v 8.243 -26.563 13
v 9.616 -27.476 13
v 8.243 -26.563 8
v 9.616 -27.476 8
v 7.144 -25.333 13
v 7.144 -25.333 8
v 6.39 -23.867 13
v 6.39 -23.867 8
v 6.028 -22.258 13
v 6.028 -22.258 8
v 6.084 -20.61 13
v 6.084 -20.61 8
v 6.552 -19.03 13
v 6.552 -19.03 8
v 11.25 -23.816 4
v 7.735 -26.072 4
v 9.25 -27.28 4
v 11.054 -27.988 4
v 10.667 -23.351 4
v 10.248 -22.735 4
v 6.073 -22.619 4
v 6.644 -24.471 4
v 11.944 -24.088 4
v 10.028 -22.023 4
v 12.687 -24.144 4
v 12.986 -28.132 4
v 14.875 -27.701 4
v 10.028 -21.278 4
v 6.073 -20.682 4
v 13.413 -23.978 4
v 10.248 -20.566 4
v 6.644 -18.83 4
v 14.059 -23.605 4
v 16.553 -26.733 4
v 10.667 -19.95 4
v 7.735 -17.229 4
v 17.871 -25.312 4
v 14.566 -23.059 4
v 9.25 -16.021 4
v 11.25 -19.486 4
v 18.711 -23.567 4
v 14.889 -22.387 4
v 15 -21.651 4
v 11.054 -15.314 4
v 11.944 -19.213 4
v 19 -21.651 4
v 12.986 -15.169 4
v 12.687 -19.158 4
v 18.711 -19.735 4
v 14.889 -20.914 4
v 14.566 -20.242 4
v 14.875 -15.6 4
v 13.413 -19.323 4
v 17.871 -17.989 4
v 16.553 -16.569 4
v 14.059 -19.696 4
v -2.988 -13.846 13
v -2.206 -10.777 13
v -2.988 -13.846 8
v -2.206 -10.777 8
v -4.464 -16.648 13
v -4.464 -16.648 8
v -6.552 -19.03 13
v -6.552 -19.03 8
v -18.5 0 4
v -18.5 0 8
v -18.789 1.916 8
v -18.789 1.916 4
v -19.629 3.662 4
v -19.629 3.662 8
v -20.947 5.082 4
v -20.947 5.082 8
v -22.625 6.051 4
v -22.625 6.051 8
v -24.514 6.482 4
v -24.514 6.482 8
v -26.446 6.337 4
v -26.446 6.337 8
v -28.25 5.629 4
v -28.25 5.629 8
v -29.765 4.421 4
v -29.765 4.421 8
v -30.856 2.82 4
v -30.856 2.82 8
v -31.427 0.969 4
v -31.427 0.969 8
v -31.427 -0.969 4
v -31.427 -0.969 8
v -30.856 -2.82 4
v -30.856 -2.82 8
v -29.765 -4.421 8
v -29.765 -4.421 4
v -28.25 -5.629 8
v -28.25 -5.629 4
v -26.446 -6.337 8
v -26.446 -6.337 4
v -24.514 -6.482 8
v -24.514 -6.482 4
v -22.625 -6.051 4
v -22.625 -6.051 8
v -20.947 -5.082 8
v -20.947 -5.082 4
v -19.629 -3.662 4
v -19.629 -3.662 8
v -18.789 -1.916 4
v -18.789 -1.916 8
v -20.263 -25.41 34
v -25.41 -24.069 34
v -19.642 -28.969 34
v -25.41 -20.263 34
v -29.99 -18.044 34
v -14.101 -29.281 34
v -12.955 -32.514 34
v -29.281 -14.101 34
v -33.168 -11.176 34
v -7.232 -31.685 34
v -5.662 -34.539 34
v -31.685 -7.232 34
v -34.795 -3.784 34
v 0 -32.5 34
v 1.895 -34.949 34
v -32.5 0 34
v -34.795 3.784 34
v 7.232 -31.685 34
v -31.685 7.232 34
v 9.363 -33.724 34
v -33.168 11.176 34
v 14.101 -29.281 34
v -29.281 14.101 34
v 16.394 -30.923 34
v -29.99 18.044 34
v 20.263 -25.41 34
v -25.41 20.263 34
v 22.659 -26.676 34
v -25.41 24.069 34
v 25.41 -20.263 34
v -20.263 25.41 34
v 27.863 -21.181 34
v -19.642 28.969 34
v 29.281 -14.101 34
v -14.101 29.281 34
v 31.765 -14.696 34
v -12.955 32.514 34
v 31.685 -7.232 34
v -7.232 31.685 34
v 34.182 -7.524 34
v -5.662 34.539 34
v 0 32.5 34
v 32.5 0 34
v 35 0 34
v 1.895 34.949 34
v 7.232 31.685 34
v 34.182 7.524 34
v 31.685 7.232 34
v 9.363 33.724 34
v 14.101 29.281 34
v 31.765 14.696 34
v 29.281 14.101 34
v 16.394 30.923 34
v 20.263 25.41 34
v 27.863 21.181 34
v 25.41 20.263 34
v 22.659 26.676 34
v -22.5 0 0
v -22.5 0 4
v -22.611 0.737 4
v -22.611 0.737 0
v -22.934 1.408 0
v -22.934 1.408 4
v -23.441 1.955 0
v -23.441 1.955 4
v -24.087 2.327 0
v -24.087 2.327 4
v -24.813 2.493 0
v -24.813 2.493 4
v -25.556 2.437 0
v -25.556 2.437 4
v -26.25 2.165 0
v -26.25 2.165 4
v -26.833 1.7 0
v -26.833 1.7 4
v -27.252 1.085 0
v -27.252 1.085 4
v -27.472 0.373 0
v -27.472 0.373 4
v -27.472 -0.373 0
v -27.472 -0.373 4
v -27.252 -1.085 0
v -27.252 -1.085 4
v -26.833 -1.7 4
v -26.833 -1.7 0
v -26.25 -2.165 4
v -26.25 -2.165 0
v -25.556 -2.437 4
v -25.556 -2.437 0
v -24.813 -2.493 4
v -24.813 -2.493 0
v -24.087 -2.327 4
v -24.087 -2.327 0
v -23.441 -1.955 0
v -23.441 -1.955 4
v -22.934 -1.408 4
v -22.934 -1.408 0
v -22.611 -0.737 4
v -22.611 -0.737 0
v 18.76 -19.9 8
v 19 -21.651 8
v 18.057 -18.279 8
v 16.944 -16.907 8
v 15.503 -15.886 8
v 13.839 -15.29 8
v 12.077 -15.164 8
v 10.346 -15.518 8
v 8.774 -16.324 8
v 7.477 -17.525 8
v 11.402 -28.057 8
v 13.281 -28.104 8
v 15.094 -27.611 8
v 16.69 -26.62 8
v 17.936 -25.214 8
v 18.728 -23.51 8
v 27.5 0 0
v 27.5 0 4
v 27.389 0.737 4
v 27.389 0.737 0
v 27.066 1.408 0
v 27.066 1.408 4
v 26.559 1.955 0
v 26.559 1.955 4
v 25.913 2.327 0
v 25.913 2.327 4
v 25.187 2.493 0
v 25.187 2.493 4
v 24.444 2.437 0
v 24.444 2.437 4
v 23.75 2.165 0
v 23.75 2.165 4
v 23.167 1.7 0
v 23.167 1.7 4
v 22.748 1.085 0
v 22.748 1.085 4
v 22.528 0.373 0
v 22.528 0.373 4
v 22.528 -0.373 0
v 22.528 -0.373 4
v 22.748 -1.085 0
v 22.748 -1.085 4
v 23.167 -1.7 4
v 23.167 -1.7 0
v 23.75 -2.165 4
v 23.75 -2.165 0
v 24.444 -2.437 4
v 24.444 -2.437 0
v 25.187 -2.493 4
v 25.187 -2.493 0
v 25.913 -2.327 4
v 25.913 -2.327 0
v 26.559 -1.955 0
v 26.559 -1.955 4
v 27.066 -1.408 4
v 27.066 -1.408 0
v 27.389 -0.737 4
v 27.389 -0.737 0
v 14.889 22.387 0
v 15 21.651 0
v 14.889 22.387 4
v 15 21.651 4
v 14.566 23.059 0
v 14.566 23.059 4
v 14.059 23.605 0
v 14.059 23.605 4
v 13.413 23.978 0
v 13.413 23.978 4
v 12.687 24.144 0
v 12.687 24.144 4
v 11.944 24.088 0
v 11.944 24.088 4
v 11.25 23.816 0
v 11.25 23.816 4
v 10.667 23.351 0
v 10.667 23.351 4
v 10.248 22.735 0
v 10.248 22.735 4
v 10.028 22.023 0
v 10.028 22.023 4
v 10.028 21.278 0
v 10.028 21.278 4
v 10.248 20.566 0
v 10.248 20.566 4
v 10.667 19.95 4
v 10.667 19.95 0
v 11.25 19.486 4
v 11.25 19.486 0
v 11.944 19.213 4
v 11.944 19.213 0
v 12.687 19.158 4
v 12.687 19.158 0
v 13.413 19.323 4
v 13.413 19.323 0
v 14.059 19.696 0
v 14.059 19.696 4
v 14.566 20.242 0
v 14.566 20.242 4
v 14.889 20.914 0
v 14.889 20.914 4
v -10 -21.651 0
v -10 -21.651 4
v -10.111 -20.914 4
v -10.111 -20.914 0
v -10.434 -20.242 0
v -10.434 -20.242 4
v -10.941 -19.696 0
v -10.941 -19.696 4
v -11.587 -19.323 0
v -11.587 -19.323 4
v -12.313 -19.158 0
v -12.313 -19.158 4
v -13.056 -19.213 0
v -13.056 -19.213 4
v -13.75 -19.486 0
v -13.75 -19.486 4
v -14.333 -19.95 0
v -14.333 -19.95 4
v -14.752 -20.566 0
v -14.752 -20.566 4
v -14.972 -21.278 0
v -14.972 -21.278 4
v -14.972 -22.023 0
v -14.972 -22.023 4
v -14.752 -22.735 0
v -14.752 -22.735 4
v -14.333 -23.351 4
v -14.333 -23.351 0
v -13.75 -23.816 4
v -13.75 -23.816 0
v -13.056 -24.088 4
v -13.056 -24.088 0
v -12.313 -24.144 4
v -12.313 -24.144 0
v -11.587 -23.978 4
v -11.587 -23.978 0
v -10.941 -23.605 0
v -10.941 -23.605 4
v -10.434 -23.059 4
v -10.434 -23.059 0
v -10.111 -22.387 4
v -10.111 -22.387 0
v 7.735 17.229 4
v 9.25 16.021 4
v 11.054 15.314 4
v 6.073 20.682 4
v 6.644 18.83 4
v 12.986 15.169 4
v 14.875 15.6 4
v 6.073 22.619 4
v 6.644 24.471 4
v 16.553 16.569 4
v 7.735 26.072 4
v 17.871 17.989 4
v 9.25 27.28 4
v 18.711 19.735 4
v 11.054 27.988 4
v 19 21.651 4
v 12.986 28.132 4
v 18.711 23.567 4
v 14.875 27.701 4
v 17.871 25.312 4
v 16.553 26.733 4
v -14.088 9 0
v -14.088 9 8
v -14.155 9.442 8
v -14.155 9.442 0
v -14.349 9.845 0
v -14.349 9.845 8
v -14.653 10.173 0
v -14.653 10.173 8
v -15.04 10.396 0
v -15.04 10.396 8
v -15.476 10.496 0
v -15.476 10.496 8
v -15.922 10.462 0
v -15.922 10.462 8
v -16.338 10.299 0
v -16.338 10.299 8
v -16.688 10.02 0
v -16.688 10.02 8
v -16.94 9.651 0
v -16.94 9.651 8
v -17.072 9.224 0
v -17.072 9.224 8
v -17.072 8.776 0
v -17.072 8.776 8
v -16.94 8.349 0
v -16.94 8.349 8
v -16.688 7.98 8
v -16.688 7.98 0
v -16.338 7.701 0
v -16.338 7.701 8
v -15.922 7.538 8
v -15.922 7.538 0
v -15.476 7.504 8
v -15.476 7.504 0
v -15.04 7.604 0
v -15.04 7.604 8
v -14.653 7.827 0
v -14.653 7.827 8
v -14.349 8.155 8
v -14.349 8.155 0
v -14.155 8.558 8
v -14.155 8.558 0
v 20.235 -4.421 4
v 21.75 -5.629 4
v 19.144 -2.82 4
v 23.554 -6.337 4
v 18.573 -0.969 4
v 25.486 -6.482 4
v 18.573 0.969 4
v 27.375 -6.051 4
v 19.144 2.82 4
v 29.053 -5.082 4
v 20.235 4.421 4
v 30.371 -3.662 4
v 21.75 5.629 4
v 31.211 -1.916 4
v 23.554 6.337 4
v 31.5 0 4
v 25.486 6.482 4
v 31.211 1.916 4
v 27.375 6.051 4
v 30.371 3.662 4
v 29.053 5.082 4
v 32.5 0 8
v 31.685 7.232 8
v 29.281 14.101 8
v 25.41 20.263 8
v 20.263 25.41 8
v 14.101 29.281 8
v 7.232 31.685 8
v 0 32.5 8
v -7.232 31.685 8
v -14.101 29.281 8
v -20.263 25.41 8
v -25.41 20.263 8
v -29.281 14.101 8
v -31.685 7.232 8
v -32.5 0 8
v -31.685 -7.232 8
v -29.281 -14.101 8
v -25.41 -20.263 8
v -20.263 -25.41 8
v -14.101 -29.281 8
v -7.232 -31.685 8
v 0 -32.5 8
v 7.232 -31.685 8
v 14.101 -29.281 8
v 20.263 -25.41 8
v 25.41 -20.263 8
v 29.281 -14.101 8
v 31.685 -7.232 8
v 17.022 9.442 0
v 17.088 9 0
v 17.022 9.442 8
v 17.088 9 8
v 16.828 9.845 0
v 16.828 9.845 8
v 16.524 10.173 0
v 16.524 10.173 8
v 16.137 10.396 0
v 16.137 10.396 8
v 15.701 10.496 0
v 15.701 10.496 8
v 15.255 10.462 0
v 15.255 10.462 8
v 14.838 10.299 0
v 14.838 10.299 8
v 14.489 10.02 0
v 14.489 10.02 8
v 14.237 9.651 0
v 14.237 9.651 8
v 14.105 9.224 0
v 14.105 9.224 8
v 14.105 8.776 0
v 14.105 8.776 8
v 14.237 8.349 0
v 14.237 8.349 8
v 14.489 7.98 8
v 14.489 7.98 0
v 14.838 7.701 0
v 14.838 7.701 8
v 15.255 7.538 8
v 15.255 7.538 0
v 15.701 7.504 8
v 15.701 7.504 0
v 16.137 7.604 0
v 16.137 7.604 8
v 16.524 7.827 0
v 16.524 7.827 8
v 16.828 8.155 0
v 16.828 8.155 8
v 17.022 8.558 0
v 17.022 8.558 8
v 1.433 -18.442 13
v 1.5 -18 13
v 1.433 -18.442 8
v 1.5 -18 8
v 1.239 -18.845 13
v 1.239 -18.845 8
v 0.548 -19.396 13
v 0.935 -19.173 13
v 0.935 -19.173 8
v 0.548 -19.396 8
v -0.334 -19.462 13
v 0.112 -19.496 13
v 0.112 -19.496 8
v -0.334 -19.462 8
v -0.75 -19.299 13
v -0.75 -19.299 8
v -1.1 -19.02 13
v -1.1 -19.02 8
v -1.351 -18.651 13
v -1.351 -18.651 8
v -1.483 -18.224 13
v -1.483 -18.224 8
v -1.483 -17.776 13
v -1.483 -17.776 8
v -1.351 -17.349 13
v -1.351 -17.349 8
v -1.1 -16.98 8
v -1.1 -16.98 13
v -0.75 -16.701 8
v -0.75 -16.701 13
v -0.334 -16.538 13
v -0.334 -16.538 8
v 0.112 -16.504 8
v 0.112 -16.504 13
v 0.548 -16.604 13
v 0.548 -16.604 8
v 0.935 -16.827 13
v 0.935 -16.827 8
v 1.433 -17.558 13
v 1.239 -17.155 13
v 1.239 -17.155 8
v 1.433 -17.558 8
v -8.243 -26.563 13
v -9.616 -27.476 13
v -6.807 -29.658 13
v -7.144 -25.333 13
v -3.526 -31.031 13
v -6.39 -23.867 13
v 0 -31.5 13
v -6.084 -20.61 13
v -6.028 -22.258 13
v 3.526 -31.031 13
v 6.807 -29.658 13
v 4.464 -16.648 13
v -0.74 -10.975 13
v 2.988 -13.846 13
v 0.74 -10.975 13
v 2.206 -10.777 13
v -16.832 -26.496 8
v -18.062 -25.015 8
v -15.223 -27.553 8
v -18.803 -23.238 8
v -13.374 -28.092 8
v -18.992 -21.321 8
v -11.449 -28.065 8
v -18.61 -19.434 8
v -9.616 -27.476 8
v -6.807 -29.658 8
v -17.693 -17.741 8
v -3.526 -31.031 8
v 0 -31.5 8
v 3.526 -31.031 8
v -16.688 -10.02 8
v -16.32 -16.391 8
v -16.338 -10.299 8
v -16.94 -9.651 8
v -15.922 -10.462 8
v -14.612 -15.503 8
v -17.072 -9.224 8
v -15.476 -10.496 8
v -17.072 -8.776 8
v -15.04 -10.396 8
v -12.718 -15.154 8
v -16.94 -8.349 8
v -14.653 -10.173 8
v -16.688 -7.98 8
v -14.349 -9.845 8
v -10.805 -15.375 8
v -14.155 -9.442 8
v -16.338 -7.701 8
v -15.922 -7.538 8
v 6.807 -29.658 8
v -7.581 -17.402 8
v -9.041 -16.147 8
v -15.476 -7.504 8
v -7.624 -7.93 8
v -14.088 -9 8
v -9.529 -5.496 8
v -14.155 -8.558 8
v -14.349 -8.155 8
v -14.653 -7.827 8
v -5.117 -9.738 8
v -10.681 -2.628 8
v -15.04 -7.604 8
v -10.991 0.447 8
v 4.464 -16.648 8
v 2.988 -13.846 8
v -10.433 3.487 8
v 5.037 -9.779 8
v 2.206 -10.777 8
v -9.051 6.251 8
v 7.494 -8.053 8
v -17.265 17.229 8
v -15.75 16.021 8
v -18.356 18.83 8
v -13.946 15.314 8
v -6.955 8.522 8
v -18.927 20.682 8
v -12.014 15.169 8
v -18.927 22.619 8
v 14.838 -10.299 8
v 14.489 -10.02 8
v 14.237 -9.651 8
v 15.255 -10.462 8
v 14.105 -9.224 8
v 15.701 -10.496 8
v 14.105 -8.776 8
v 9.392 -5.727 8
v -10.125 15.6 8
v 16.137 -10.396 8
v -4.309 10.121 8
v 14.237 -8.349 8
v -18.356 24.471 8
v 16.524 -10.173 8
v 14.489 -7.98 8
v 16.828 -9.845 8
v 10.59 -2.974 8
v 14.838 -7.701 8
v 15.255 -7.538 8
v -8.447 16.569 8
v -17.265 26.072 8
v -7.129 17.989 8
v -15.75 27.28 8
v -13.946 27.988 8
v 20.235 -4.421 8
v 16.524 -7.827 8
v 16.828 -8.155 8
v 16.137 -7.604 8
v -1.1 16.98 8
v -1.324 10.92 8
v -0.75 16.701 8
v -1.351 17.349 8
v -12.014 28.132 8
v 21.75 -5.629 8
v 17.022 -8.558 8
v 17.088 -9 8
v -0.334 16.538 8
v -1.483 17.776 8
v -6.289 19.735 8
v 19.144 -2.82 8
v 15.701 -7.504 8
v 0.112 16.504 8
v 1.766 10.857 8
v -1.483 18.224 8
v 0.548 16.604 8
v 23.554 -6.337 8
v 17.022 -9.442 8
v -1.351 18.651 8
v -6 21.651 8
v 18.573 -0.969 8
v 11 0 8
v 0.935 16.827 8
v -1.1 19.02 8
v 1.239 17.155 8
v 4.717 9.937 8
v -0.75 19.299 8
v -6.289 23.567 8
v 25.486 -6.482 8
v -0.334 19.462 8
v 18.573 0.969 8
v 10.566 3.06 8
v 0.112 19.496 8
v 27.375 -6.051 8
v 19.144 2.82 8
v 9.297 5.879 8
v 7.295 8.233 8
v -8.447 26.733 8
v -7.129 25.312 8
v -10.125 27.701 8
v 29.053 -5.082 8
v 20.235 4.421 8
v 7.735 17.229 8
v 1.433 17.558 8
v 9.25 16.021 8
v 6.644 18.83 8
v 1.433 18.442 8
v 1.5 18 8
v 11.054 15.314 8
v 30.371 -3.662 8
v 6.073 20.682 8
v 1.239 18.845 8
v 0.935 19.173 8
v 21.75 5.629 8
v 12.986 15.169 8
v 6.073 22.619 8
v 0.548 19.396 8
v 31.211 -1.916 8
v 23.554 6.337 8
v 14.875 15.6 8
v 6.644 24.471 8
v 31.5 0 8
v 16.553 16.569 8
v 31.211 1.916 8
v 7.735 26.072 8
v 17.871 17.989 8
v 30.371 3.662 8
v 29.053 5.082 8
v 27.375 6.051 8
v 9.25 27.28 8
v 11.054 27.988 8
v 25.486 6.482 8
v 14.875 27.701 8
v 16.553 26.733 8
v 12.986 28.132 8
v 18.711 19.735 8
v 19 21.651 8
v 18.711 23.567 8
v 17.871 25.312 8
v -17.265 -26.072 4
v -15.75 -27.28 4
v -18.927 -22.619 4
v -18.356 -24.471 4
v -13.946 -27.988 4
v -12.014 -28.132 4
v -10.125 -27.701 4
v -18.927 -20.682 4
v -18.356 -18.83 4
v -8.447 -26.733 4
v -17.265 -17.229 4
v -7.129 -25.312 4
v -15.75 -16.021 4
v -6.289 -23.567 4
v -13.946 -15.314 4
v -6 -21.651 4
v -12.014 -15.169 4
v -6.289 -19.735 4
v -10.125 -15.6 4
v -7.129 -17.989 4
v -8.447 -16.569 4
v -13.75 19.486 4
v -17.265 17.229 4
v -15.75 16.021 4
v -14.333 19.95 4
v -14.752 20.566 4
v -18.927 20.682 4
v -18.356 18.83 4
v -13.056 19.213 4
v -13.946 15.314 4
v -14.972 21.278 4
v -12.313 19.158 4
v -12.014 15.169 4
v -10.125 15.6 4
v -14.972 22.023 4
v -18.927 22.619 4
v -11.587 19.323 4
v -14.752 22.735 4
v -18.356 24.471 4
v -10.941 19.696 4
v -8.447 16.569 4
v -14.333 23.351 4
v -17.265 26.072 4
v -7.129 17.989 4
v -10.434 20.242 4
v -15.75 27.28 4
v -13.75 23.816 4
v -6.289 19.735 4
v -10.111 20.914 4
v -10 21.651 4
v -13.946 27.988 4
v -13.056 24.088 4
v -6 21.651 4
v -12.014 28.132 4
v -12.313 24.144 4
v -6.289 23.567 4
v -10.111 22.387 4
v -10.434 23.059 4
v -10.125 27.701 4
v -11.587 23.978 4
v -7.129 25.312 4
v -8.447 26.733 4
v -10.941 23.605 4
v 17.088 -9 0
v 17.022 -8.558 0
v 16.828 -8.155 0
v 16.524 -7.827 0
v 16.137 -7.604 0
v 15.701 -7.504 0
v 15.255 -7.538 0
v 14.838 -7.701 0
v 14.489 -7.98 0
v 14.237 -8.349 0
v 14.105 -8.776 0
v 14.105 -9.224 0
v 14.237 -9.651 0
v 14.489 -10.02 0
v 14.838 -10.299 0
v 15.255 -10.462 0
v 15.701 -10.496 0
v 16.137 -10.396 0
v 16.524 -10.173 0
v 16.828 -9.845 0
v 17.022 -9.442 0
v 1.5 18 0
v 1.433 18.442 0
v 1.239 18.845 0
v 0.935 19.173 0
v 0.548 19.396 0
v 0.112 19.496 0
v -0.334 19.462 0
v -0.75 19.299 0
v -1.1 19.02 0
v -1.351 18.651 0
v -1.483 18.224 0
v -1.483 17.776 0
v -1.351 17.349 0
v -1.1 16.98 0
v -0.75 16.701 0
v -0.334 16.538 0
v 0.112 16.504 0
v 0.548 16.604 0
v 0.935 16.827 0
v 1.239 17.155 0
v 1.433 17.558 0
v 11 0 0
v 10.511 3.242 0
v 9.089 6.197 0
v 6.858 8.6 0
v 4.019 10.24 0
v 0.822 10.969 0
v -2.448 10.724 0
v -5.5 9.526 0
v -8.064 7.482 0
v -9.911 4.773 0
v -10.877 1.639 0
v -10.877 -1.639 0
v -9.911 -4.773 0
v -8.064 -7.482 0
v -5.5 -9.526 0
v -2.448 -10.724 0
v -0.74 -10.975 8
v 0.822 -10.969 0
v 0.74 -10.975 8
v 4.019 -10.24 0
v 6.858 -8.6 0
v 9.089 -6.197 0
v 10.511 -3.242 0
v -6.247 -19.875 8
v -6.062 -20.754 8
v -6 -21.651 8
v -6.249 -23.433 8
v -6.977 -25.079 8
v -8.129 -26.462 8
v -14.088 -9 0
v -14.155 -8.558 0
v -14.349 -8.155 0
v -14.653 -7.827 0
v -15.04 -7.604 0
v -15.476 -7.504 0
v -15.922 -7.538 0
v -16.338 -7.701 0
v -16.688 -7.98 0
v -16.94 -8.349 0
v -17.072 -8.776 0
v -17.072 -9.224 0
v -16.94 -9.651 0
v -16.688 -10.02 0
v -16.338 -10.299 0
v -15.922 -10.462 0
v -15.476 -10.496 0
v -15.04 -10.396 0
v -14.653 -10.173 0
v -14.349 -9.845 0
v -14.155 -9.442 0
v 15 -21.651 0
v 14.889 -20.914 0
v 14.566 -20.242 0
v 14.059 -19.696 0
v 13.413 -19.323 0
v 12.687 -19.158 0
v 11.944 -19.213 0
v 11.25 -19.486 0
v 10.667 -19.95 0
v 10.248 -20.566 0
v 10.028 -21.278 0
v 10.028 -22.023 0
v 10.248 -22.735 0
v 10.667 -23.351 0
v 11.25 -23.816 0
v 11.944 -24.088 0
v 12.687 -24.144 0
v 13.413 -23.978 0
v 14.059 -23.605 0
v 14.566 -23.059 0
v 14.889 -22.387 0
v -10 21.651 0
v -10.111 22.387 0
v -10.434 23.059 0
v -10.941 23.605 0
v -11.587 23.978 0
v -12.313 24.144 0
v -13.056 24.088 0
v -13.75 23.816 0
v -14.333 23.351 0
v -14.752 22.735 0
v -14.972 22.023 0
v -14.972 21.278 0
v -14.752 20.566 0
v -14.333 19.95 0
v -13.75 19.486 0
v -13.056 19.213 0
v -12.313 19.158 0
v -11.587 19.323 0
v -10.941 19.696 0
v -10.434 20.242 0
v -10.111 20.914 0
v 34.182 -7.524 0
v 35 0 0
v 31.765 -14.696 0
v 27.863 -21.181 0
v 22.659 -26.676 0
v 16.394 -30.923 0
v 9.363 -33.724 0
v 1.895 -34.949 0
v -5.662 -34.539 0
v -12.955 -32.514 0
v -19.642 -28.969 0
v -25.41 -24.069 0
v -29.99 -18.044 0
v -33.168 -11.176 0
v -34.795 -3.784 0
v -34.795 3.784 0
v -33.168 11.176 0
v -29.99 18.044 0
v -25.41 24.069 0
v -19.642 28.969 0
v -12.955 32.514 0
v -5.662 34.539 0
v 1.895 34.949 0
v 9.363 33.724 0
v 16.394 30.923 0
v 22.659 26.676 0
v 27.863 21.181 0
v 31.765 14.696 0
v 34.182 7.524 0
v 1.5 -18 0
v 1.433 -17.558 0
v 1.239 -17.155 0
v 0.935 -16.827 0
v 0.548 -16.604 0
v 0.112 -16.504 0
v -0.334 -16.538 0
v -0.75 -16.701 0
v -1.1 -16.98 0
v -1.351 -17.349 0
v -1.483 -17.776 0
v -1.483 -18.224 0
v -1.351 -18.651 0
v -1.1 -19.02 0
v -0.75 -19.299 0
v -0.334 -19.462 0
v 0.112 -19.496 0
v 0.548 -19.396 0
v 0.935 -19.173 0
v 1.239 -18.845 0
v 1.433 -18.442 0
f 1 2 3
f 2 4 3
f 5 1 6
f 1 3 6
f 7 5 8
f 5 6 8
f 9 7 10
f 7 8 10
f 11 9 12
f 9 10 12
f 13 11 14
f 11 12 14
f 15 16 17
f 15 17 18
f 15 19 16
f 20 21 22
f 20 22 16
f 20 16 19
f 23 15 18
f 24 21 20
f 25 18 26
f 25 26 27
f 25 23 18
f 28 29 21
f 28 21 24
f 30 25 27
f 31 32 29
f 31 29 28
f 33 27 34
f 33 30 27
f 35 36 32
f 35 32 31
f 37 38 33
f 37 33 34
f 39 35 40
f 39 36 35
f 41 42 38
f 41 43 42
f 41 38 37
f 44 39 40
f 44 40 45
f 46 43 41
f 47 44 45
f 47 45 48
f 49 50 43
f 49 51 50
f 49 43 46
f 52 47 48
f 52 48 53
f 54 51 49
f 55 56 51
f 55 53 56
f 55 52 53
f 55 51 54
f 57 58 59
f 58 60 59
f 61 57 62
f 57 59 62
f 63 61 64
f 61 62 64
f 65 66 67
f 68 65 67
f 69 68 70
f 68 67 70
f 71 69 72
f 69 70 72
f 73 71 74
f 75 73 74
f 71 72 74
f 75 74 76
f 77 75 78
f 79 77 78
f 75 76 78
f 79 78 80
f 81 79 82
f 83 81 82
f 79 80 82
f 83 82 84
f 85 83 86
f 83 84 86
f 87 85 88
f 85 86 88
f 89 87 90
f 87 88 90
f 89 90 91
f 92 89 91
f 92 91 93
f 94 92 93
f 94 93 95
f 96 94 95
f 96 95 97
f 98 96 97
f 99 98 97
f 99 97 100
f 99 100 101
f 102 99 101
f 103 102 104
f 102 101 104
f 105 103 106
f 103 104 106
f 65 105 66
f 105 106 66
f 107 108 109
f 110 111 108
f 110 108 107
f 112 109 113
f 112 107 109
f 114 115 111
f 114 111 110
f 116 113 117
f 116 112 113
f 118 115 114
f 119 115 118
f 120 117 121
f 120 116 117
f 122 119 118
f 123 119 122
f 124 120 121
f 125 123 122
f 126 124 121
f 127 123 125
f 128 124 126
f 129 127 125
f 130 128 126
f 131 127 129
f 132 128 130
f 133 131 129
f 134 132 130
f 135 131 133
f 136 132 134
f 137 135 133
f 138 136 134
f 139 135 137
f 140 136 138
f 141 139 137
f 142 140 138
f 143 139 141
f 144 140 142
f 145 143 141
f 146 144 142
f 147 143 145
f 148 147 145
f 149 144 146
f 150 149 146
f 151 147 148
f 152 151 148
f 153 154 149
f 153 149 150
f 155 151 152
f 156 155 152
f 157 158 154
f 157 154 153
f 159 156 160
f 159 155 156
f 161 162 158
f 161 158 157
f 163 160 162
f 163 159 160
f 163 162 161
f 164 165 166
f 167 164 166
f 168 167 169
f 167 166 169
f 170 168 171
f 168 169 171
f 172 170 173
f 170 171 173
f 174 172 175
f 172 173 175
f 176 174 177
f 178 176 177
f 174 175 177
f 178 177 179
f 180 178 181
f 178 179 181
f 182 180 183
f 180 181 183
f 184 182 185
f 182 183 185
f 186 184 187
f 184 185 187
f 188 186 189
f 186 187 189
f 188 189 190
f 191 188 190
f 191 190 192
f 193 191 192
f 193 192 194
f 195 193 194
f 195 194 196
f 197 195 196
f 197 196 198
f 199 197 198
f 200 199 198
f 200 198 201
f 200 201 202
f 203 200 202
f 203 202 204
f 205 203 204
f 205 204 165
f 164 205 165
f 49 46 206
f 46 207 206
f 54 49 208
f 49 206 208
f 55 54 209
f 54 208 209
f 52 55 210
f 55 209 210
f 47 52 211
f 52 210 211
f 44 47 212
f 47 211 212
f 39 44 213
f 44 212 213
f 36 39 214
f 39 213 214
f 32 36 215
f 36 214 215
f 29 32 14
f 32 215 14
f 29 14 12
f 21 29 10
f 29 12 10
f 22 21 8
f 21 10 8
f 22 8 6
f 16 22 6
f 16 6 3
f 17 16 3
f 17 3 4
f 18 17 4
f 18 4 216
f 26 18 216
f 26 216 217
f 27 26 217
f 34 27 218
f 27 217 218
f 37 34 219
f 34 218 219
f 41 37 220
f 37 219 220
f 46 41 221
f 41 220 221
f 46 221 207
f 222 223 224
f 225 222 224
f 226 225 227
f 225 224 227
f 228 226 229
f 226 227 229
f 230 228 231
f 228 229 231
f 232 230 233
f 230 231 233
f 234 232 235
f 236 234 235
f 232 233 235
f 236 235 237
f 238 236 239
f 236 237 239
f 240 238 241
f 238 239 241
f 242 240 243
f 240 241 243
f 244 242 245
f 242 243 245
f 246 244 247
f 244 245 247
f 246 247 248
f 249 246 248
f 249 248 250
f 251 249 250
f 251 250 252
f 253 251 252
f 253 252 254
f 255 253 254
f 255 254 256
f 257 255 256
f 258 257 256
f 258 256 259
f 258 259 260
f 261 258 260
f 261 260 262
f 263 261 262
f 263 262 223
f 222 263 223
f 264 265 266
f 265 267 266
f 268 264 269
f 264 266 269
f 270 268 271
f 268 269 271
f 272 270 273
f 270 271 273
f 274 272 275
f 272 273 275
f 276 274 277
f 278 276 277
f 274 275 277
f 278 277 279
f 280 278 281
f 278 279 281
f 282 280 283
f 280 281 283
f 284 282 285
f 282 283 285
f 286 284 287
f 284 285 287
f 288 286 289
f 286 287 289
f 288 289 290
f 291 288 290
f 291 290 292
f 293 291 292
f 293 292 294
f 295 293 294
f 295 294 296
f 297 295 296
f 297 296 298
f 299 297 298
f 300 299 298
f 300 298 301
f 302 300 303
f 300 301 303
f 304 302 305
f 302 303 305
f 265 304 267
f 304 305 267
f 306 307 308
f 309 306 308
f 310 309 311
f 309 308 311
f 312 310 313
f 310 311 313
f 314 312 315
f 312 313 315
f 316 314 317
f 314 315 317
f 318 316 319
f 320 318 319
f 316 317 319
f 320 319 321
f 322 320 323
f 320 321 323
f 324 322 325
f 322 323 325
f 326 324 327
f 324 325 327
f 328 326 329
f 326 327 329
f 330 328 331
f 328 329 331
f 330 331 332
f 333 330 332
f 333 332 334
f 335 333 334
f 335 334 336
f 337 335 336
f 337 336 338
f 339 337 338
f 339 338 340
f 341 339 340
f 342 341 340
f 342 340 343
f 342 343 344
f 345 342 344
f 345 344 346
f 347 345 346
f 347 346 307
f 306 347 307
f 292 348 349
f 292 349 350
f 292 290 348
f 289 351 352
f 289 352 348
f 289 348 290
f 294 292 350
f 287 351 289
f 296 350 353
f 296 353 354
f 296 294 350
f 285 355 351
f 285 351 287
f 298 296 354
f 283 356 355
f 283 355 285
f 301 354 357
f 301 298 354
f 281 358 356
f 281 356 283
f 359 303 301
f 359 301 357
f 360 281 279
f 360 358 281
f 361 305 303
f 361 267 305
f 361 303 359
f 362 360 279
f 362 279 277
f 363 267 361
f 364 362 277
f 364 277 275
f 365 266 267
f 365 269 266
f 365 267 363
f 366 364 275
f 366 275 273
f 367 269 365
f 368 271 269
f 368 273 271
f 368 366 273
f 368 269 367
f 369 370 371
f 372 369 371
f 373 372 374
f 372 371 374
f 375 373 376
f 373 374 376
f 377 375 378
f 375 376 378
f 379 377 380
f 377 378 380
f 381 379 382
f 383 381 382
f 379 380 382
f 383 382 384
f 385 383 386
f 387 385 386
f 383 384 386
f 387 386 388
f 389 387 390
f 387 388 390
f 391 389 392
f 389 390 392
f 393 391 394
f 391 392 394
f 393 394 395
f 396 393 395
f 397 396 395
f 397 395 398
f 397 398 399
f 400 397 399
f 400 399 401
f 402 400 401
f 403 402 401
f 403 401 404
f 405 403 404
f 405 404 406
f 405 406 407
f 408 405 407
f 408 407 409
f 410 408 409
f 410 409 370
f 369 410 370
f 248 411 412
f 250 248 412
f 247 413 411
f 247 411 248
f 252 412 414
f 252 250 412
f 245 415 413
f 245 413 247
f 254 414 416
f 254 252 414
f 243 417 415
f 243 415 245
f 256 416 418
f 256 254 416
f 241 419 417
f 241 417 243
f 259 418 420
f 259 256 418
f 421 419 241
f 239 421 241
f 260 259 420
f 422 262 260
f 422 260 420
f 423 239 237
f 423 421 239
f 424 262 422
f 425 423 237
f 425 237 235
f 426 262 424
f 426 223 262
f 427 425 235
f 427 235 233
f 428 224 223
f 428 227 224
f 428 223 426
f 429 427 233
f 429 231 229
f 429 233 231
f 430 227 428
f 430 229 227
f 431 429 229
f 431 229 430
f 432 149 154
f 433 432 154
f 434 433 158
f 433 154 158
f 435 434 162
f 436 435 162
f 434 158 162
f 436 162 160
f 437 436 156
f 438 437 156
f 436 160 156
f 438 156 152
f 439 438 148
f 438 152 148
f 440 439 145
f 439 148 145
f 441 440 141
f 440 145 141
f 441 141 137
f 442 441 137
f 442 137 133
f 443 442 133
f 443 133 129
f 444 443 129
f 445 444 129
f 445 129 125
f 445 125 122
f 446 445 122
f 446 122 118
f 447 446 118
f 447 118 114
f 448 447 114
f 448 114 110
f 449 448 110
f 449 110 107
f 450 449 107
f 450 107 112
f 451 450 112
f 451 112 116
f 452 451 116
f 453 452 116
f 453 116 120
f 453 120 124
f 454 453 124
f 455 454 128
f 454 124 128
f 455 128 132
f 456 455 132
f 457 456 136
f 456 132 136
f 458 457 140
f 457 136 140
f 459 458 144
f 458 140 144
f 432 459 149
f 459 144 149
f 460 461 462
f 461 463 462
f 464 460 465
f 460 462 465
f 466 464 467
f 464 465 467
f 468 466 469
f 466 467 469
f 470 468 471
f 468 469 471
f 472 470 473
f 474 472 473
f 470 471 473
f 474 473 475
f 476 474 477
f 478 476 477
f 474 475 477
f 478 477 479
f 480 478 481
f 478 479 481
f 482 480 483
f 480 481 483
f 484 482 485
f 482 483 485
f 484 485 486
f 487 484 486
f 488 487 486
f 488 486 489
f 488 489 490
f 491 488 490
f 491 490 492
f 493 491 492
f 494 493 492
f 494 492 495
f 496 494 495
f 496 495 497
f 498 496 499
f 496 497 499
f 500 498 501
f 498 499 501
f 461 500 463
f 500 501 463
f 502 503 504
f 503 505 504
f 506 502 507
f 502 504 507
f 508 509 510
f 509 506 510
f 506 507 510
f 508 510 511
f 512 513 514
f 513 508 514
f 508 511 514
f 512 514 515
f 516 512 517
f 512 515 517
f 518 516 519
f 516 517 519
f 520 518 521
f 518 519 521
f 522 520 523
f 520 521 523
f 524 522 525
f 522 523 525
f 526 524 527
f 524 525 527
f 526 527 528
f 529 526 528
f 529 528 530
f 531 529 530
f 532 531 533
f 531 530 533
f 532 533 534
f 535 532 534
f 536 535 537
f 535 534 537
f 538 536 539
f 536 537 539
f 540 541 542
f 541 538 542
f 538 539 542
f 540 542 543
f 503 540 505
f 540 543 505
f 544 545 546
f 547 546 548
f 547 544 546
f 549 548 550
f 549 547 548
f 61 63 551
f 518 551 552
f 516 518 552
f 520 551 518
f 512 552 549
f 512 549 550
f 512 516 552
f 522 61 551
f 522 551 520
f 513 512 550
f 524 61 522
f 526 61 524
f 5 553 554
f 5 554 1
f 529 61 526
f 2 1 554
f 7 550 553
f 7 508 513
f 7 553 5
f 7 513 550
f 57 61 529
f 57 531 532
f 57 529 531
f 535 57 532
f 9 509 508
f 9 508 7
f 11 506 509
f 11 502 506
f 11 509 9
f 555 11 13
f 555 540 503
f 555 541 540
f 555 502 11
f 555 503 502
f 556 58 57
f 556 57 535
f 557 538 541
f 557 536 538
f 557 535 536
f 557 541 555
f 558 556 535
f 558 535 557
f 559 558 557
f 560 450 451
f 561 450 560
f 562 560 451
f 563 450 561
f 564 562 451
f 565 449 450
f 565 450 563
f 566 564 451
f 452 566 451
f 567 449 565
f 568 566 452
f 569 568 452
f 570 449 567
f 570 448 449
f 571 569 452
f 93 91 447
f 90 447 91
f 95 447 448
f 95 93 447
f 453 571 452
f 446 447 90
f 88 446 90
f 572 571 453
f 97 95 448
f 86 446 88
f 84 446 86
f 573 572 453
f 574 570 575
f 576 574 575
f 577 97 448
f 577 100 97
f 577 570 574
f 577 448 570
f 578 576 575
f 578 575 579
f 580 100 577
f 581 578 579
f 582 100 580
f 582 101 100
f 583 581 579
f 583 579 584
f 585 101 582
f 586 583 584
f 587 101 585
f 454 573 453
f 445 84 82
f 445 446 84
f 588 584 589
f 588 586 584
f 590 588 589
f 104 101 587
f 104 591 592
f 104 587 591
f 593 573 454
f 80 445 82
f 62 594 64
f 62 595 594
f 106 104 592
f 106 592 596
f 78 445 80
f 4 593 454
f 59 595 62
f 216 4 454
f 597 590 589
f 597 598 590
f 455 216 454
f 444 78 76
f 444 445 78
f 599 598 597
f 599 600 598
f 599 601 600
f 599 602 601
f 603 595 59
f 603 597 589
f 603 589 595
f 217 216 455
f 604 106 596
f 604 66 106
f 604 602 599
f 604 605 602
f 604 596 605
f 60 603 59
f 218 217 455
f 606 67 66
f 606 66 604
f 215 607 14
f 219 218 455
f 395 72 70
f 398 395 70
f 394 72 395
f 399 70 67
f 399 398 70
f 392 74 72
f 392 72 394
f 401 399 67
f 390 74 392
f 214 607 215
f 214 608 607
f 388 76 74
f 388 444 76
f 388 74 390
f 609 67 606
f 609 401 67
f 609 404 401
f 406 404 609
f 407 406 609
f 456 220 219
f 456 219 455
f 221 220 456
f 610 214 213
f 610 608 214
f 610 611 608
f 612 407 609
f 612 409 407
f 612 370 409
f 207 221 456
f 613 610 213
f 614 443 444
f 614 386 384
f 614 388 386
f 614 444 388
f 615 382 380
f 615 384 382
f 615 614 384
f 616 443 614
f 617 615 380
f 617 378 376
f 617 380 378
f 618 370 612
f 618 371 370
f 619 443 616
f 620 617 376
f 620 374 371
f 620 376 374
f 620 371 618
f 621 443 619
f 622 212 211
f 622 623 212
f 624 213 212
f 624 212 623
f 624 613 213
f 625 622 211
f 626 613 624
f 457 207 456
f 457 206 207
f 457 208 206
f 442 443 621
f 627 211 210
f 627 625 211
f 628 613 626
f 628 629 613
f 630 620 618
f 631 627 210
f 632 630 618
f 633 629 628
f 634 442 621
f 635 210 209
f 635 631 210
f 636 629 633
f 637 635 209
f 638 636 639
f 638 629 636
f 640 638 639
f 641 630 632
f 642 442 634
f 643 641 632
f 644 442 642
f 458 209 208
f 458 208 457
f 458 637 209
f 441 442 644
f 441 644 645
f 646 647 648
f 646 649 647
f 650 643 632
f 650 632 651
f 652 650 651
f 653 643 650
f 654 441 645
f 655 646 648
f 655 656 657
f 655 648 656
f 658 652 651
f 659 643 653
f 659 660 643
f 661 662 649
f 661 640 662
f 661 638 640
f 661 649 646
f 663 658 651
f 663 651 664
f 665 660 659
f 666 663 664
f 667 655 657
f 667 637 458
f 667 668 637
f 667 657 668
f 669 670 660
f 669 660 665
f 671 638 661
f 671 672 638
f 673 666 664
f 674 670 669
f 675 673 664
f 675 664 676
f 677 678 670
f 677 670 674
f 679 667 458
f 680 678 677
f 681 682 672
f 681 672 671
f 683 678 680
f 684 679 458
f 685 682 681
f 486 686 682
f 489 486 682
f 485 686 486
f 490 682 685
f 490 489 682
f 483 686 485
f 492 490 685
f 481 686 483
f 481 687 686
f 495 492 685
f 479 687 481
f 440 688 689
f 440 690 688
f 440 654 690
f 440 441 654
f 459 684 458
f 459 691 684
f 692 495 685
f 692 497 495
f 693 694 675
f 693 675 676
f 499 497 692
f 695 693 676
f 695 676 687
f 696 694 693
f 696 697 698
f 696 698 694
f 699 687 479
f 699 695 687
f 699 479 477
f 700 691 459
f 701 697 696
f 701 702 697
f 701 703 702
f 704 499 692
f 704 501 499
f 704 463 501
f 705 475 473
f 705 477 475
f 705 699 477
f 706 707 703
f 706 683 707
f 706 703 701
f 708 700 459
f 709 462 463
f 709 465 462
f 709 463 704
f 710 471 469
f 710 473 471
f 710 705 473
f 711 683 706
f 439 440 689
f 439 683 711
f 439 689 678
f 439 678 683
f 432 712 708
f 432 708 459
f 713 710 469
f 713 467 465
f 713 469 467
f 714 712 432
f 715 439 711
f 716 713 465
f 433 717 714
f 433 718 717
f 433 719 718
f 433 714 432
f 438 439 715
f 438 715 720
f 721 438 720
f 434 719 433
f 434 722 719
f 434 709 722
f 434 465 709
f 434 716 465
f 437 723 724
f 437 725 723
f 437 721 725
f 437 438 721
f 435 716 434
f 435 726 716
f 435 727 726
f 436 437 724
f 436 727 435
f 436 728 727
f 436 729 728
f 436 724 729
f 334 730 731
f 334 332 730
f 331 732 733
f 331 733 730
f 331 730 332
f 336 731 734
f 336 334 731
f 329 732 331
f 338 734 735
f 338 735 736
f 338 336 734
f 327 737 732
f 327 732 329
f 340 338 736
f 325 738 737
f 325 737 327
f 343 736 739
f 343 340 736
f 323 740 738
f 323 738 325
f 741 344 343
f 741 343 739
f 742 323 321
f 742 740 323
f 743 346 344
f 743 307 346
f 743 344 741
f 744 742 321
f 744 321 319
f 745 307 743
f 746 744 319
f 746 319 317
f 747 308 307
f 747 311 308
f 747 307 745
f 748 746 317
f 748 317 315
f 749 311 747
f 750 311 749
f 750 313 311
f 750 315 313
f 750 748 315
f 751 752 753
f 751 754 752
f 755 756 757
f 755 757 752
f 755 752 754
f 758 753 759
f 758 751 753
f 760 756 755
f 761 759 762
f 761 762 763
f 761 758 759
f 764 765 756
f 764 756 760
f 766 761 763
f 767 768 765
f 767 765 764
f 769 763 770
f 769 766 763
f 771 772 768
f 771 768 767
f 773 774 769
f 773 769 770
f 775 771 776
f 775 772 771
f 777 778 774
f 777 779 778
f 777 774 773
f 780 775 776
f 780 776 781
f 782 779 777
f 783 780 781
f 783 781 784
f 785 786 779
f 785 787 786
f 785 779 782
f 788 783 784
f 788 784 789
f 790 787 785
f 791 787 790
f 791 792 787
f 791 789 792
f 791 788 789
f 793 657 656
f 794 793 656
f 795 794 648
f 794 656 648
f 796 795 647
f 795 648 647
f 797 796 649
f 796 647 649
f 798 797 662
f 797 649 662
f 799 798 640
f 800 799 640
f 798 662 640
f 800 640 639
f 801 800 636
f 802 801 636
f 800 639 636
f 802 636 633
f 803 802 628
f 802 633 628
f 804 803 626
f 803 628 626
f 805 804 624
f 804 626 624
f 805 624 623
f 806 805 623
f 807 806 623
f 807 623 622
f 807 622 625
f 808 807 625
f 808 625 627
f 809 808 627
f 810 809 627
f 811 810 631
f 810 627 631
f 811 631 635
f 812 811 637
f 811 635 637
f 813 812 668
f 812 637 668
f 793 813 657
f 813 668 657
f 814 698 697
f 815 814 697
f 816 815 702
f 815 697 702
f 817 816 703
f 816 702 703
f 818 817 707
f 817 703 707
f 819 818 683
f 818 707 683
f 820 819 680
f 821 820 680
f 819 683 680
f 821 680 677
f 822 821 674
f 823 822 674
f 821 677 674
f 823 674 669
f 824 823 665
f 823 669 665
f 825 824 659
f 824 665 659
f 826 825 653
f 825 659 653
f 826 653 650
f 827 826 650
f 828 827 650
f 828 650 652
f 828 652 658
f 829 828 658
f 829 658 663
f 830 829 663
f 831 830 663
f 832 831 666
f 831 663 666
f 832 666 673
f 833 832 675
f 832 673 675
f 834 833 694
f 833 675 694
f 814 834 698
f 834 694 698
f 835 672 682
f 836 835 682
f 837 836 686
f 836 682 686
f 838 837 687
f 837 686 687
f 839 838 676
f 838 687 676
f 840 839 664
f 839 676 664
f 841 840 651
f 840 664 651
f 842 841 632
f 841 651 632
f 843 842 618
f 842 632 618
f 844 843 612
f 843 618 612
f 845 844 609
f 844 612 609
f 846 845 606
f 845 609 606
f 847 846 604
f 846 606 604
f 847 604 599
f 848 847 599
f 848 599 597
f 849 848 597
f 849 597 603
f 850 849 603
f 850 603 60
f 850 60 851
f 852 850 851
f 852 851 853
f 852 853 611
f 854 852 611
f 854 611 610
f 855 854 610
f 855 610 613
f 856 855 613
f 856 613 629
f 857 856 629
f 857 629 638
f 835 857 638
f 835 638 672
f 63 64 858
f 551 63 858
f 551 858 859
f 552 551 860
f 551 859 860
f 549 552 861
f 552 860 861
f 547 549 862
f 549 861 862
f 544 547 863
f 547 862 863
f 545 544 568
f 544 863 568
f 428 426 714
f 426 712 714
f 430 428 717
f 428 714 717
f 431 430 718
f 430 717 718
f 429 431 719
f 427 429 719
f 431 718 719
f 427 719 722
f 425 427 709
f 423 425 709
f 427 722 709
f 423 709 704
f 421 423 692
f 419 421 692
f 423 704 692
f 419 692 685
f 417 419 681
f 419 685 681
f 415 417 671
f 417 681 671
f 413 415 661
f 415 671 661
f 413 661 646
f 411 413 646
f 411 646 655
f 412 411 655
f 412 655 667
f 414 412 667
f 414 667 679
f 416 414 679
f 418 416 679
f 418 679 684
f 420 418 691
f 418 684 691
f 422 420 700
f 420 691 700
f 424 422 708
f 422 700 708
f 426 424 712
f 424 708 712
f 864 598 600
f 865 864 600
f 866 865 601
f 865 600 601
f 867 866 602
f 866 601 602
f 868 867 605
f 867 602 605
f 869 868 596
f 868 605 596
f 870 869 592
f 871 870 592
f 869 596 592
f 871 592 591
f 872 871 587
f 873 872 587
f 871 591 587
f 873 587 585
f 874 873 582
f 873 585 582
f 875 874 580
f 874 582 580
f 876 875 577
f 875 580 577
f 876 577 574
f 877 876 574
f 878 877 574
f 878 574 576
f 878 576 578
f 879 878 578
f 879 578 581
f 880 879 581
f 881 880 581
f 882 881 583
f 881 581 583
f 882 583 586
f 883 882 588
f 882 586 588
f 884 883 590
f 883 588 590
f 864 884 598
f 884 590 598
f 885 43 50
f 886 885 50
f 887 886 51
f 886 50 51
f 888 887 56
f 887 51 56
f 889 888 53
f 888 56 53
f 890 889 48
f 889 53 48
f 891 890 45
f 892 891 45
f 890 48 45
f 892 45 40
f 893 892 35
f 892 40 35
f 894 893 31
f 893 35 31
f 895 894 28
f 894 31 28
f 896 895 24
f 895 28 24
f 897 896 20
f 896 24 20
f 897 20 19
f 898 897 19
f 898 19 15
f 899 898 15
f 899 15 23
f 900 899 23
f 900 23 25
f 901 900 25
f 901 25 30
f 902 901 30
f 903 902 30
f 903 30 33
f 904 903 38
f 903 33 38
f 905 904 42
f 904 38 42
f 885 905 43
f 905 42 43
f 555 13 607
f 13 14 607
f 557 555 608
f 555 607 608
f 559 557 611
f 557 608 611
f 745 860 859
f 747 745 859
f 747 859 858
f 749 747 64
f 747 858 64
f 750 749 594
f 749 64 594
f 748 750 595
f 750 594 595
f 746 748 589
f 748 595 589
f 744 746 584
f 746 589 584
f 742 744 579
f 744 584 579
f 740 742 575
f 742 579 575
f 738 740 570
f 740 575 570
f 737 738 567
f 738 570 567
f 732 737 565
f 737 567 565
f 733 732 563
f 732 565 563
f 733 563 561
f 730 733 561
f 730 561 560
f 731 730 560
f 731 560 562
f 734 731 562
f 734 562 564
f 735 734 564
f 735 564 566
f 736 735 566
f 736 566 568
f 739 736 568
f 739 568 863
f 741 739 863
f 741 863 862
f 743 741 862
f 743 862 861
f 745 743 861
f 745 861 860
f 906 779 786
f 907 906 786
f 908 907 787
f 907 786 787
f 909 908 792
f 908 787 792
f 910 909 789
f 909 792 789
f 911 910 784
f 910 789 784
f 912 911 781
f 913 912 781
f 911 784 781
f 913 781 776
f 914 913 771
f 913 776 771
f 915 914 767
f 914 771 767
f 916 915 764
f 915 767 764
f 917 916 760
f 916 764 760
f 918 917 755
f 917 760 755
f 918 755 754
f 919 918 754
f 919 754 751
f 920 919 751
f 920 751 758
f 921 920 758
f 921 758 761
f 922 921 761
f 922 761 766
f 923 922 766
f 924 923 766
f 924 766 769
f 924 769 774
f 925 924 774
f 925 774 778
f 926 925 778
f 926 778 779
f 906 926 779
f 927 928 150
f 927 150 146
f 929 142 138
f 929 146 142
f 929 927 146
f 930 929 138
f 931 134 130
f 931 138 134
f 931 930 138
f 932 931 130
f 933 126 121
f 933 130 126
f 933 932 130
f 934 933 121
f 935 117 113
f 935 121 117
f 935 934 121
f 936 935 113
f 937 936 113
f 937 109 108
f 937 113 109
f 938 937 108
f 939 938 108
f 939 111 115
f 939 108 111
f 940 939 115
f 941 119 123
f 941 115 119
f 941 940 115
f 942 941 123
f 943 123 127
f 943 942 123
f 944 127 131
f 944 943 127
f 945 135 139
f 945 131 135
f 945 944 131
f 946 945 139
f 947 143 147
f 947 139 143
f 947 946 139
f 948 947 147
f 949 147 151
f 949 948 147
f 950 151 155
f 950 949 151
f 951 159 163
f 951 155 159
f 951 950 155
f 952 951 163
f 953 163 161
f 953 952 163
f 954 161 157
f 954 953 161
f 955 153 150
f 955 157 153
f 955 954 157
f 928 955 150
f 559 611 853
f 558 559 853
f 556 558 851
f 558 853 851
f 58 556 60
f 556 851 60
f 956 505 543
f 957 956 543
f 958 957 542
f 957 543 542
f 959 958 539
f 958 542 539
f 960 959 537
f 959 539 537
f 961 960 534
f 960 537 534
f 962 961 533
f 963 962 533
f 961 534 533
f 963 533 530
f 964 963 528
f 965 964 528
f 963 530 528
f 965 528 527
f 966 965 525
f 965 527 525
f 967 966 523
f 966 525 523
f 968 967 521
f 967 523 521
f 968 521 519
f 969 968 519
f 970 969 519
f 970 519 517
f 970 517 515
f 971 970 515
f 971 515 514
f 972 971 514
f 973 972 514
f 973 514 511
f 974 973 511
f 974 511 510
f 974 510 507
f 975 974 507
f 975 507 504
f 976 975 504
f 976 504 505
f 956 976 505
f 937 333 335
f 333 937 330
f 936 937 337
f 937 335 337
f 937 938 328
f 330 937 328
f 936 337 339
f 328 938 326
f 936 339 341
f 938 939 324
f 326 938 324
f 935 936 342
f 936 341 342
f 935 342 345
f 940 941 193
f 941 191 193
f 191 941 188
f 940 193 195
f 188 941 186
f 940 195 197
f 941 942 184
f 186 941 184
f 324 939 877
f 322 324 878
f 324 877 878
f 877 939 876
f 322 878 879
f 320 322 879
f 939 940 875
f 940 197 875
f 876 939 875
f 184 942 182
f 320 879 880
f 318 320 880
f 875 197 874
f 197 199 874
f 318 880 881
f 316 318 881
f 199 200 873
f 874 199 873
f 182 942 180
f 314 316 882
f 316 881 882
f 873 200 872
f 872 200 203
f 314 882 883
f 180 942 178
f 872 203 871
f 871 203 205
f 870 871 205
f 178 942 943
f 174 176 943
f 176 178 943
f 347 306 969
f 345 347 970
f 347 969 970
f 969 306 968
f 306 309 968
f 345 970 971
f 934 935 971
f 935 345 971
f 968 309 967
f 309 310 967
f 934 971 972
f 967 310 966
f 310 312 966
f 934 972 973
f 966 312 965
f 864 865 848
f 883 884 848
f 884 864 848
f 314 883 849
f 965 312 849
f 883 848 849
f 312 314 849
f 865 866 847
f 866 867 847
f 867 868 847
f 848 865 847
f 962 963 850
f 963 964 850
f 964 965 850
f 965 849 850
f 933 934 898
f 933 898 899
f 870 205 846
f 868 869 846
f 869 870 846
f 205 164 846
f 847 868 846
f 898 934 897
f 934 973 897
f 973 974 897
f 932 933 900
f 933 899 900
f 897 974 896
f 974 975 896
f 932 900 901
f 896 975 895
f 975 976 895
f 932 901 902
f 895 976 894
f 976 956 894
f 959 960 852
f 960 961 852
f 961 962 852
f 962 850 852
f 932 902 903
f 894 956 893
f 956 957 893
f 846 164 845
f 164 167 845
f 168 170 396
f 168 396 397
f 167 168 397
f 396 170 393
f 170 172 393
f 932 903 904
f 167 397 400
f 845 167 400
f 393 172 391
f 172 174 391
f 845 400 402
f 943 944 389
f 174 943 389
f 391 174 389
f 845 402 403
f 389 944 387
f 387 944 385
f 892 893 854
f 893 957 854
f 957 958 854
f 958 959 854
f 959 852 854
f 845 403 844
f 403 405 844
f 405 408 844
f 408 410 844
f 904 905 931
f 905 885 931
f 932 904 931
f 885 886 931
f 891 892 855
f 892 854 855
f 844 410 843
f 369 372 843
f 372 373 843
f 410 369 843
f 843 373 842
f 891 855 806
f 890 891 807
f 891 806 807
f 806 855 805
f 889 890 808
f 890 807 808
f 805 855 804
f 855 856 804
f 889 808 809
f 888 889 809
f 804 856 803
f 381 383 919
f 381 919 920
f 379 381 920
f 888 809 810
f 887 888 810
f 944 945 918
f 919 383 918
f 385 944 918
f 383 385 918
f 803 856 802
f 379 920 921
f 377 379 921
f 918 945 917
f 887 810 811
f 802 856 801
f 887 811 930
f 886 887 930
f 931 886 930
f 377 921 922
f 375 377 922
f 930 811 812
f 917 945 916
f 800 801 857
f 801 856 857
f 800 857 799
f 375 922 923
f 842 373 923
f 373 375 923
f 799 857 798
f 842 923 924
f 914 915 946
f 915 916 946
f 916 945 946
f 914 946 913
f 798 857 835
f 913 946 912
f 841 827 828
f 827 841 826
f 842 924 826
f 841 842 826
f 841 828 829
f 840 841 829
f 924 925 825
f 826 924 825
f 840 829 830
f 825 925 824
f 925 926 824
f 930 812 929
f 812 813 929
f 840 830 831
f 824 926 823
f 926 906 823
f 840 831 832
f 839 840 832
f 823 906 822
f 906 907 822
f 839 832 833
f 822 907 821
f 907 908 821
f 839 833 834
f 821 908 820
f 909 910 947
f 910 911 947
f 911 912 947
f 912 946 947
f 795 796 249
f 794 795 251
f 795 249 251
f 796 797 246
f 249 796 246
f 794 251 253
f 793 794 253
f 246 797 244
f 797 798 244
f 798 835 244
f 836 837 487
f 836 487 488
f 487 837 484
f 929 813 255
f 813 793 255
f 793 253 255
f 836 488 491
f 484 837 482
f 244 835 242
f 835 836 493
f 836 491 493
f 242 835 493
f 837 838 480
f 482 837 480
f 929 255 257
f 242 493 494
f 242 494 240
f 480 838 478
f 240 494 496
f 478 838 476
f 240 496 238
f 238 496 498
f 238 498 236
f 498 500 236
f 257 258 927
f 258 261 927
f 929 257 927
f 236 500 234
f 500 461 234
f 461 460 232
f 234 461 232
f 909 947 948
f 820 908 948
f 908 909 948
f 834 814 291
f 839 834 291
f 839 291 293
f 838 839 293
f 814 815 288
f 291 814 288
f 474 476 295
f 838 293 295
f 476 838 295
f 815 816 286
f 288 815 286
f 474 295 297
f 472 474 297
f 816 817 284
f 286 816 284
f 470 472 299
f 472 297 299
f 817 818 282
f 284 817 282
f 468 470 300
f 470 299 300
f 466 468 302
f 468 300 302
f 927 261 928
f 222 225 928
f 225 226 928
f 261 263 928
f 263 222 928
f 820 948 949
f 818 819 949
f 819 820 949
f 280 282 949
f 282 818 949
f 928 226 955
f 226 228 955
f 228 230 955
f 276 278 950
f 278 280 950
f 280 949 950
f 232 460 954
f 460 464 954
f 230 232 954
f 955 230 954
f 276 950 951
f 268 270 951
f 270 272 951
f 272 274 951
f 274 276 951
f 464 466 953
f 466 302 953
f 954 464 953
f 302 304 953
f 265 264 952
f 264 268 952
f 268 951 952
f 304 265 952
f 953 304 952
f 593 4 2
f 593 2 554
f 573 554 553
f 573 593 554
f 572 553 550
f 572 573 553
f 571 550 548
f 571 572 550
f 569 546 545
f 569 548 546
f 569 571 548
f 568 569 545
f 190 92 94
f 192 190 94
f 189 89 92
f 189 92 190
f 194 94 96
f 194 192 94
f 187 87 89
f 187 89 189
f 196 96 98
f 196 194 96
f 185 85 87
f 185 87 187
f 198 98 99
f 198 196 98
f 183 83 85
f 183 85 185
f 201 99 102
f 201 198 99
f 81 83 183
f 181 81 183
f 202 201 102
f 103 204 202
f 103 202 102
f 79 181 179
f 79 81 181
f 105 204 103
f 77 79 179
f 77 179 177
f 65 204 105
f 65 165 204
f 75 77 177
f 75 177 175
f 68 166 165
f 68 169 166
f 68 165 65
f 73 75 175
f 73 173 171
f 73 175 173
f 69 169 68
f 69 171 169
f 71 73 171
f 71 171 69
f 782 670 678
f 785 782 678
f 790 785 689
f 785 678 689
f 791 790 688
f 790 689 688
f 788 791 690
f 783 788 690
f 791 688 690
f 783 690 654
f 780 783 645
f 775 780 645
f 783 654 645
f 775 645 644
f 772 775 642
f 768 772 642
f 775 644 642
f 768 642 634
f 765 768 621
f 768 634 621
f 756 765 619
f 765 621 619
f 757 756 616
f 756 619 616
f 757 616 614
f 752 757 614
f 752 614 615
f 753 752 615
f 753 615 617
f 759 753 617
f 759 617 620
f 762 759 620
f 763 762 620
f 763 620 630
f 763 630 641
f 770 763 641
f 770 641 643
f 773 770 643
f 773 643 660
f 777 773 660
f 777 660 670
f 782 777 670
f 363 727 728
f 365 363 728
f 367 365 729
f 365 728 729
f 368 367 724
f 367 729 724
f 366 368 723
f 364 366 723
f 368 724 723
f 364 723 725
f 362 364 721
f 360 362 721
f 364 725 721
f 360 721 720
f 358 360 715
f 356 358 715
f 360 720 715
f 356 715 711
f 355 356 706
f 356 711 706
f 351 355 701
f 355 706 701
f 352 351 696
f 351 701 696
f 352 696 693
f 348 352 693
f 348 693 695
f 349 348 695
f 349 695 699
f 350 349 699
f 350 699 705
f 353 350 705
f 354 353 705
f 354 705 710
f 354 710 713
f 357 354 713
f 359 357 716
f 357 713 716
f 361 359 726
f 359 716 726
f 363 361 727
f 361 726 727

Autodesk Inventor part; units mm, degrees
ref_plane "YZ Plane" through (0, 0, 0) normal (1, 0, 0) x (0, 1, 0)
ref_plane "XZ Plane" through (0, 0, 0) normal (0, 1, 0) x (-1, 0, 0)
ref_plane "XY Plane" through (0, 0, 0) normal (0, 0, 1) x (1, 0, 0)
sketch "Sketch1" plane through (0, 0, 0) normal (0, 0, 1) x (1, 0, 0)
  circle A0 centre (0, 0) radius 35
  dimension "d0" = 70
extrude "Extrusion1" add sketch "Sketch1" along normal blind 34
sketch "Sketch2" plane through (0, 0, 34) normal (0, 0, 1) x (1, 0, 0)
  circle A0 centre (0, 0) radius 35 projected
  circle A1 centre (0, 0) radius 32.5
  dimension "d105" = 65
extrude "Extrusion2" cut sketch "Sketch2" against normal blind 26 contours A1
sketch "Sketch3" plane through (0, 0, 8) normal (0, 0, 1) x (1, 0, 0)
  circle A0 centre (0, 0) radius 11
  dimension "d6" = 22
extrude "Extrusion3" cut sketch "Sketch3" against normal through all
sketch "Sketch4" plane through (0, 0, 8) normal (0, 0, 1) x (1, 0, 0)
  circle A0 centre (25, 0) radius 6.5
  circle A1 centre (12.5, 21.6506) radius 6.5
  circle A2 centre (-12.5, 21.6506) radius 6.5
  circle A3 centre (-25, 0) radius 6.5
  circle A4 centre (-12.5, -21.6506) radius 6.5
  circle A5 centre (12.5, -21.6506) radius 6.5
  point P0 (0, 0)
  dimension "d9" = 13
  dimension "d10" = 25
  dimension "d13" = 360
extrude "Extrusion4" cut sketch "Sketch4" against normal blind 4
sketch "Sketch5" plane through (0, 0, 8) normal (0, 0, 1) x (1, 0, 0)
  circle A0 centre (0, 0) radius 11 construction
  circle A1 centre (25, 0) radius 2.5
  circle A2 centre (12.5, 21.6506) radius 2.5
  circle A3 centre (-12.5, 21.6506) radius 2.5
  circle A4 centre (-25, 0) radius 2.5
  circle A5 centre (-12.5, -21.6506) radius 2.5
  circle A6 centre (12.5, -21.6506) radius 2.5
  dimension "d99" = 5
  dimension "d100" = 25
  dimension "d103" = 360
extrude "Extrusion5" cut sketch "Sketch5" against normal through all
sketch "Sketch6" plane through (0, 0, 8) normal (0, 0, 1) x (1, 0, 0)
  circle A0 centre (0, 18) radius 1.5
  circle A1 centre (-15.5885, 9) radius 1.5
  circle A2 centre (-15.5885, -9) radius 1.5
  circle A3 centre (0, -18) radius 1.5
  circle A4 centre (15.5885, -9) radius 1.5
  circle A5 centre (15.5885, 9) radius 1.5
  point P0 (0, 0)
  dimension "d24" = 3
  dimension "d25" = 18
  dimension "d28" = 360
extrude "Extrusion6" cut sketch "Sketch6" against normal through all
sketch "Sketch27" plane through (0, 0, 8) normal (0, 0, 1) x (1, 0, 0)
  circle A0 centre (-15.5885, -9) radius 1.5 construction
  circle A1 centre (-15.5885, -9) radius 13.5 construction
  circle A2 centre (15.5885, -9) radius 1.5 construction
  circle A3 centre (15.5885, -9) radius 13.5 construction
  circle A4 centre (0, -18) radius 1.5 projected
  circle A5 centre (-12.5, -21.6506) radius 6.5 construction
  circle A6 centre (0, 0) radius 11 construction
  arc A7 (-6.5519, -19.0295) -> (-2.2059, -10.7766) centre (-15.5885, -9) ccw
  arc A8 (2.2059, -10.7766) -> (6.5519, -19.0295) centre (15.5885, -9) ccw
  circle A9 centre (12.5, -21.6506) radius 6.5 construction
  circle A10 centre (0, -18) radius 13.5 construction
  arc A11 (6.5519, -19.0295) -> (9.6157, -27.4757) centre (12.5, -21.6506) ccw
  arc A12 (-9.6157, -27.4757) -> (-6.5519, -19.0295) centre (-12.5, -21.6506) ccw
  arc A13 (-9.6157, -27.4757) -> (9.6157, -27.4757) centre (0, -18) ccw
  arc A14 (-2.2059, -10.7766) -> (2.2059, -10.7766) centre (0, 0) ccw
  dimension "d106" = 27
  dimension "d107" = 27
  dimension "d108" = 27
extrude "Extrusion24" add sketch "Sketch27" along normal blind 5
properties part number "Base" material "ABS Plastic"
